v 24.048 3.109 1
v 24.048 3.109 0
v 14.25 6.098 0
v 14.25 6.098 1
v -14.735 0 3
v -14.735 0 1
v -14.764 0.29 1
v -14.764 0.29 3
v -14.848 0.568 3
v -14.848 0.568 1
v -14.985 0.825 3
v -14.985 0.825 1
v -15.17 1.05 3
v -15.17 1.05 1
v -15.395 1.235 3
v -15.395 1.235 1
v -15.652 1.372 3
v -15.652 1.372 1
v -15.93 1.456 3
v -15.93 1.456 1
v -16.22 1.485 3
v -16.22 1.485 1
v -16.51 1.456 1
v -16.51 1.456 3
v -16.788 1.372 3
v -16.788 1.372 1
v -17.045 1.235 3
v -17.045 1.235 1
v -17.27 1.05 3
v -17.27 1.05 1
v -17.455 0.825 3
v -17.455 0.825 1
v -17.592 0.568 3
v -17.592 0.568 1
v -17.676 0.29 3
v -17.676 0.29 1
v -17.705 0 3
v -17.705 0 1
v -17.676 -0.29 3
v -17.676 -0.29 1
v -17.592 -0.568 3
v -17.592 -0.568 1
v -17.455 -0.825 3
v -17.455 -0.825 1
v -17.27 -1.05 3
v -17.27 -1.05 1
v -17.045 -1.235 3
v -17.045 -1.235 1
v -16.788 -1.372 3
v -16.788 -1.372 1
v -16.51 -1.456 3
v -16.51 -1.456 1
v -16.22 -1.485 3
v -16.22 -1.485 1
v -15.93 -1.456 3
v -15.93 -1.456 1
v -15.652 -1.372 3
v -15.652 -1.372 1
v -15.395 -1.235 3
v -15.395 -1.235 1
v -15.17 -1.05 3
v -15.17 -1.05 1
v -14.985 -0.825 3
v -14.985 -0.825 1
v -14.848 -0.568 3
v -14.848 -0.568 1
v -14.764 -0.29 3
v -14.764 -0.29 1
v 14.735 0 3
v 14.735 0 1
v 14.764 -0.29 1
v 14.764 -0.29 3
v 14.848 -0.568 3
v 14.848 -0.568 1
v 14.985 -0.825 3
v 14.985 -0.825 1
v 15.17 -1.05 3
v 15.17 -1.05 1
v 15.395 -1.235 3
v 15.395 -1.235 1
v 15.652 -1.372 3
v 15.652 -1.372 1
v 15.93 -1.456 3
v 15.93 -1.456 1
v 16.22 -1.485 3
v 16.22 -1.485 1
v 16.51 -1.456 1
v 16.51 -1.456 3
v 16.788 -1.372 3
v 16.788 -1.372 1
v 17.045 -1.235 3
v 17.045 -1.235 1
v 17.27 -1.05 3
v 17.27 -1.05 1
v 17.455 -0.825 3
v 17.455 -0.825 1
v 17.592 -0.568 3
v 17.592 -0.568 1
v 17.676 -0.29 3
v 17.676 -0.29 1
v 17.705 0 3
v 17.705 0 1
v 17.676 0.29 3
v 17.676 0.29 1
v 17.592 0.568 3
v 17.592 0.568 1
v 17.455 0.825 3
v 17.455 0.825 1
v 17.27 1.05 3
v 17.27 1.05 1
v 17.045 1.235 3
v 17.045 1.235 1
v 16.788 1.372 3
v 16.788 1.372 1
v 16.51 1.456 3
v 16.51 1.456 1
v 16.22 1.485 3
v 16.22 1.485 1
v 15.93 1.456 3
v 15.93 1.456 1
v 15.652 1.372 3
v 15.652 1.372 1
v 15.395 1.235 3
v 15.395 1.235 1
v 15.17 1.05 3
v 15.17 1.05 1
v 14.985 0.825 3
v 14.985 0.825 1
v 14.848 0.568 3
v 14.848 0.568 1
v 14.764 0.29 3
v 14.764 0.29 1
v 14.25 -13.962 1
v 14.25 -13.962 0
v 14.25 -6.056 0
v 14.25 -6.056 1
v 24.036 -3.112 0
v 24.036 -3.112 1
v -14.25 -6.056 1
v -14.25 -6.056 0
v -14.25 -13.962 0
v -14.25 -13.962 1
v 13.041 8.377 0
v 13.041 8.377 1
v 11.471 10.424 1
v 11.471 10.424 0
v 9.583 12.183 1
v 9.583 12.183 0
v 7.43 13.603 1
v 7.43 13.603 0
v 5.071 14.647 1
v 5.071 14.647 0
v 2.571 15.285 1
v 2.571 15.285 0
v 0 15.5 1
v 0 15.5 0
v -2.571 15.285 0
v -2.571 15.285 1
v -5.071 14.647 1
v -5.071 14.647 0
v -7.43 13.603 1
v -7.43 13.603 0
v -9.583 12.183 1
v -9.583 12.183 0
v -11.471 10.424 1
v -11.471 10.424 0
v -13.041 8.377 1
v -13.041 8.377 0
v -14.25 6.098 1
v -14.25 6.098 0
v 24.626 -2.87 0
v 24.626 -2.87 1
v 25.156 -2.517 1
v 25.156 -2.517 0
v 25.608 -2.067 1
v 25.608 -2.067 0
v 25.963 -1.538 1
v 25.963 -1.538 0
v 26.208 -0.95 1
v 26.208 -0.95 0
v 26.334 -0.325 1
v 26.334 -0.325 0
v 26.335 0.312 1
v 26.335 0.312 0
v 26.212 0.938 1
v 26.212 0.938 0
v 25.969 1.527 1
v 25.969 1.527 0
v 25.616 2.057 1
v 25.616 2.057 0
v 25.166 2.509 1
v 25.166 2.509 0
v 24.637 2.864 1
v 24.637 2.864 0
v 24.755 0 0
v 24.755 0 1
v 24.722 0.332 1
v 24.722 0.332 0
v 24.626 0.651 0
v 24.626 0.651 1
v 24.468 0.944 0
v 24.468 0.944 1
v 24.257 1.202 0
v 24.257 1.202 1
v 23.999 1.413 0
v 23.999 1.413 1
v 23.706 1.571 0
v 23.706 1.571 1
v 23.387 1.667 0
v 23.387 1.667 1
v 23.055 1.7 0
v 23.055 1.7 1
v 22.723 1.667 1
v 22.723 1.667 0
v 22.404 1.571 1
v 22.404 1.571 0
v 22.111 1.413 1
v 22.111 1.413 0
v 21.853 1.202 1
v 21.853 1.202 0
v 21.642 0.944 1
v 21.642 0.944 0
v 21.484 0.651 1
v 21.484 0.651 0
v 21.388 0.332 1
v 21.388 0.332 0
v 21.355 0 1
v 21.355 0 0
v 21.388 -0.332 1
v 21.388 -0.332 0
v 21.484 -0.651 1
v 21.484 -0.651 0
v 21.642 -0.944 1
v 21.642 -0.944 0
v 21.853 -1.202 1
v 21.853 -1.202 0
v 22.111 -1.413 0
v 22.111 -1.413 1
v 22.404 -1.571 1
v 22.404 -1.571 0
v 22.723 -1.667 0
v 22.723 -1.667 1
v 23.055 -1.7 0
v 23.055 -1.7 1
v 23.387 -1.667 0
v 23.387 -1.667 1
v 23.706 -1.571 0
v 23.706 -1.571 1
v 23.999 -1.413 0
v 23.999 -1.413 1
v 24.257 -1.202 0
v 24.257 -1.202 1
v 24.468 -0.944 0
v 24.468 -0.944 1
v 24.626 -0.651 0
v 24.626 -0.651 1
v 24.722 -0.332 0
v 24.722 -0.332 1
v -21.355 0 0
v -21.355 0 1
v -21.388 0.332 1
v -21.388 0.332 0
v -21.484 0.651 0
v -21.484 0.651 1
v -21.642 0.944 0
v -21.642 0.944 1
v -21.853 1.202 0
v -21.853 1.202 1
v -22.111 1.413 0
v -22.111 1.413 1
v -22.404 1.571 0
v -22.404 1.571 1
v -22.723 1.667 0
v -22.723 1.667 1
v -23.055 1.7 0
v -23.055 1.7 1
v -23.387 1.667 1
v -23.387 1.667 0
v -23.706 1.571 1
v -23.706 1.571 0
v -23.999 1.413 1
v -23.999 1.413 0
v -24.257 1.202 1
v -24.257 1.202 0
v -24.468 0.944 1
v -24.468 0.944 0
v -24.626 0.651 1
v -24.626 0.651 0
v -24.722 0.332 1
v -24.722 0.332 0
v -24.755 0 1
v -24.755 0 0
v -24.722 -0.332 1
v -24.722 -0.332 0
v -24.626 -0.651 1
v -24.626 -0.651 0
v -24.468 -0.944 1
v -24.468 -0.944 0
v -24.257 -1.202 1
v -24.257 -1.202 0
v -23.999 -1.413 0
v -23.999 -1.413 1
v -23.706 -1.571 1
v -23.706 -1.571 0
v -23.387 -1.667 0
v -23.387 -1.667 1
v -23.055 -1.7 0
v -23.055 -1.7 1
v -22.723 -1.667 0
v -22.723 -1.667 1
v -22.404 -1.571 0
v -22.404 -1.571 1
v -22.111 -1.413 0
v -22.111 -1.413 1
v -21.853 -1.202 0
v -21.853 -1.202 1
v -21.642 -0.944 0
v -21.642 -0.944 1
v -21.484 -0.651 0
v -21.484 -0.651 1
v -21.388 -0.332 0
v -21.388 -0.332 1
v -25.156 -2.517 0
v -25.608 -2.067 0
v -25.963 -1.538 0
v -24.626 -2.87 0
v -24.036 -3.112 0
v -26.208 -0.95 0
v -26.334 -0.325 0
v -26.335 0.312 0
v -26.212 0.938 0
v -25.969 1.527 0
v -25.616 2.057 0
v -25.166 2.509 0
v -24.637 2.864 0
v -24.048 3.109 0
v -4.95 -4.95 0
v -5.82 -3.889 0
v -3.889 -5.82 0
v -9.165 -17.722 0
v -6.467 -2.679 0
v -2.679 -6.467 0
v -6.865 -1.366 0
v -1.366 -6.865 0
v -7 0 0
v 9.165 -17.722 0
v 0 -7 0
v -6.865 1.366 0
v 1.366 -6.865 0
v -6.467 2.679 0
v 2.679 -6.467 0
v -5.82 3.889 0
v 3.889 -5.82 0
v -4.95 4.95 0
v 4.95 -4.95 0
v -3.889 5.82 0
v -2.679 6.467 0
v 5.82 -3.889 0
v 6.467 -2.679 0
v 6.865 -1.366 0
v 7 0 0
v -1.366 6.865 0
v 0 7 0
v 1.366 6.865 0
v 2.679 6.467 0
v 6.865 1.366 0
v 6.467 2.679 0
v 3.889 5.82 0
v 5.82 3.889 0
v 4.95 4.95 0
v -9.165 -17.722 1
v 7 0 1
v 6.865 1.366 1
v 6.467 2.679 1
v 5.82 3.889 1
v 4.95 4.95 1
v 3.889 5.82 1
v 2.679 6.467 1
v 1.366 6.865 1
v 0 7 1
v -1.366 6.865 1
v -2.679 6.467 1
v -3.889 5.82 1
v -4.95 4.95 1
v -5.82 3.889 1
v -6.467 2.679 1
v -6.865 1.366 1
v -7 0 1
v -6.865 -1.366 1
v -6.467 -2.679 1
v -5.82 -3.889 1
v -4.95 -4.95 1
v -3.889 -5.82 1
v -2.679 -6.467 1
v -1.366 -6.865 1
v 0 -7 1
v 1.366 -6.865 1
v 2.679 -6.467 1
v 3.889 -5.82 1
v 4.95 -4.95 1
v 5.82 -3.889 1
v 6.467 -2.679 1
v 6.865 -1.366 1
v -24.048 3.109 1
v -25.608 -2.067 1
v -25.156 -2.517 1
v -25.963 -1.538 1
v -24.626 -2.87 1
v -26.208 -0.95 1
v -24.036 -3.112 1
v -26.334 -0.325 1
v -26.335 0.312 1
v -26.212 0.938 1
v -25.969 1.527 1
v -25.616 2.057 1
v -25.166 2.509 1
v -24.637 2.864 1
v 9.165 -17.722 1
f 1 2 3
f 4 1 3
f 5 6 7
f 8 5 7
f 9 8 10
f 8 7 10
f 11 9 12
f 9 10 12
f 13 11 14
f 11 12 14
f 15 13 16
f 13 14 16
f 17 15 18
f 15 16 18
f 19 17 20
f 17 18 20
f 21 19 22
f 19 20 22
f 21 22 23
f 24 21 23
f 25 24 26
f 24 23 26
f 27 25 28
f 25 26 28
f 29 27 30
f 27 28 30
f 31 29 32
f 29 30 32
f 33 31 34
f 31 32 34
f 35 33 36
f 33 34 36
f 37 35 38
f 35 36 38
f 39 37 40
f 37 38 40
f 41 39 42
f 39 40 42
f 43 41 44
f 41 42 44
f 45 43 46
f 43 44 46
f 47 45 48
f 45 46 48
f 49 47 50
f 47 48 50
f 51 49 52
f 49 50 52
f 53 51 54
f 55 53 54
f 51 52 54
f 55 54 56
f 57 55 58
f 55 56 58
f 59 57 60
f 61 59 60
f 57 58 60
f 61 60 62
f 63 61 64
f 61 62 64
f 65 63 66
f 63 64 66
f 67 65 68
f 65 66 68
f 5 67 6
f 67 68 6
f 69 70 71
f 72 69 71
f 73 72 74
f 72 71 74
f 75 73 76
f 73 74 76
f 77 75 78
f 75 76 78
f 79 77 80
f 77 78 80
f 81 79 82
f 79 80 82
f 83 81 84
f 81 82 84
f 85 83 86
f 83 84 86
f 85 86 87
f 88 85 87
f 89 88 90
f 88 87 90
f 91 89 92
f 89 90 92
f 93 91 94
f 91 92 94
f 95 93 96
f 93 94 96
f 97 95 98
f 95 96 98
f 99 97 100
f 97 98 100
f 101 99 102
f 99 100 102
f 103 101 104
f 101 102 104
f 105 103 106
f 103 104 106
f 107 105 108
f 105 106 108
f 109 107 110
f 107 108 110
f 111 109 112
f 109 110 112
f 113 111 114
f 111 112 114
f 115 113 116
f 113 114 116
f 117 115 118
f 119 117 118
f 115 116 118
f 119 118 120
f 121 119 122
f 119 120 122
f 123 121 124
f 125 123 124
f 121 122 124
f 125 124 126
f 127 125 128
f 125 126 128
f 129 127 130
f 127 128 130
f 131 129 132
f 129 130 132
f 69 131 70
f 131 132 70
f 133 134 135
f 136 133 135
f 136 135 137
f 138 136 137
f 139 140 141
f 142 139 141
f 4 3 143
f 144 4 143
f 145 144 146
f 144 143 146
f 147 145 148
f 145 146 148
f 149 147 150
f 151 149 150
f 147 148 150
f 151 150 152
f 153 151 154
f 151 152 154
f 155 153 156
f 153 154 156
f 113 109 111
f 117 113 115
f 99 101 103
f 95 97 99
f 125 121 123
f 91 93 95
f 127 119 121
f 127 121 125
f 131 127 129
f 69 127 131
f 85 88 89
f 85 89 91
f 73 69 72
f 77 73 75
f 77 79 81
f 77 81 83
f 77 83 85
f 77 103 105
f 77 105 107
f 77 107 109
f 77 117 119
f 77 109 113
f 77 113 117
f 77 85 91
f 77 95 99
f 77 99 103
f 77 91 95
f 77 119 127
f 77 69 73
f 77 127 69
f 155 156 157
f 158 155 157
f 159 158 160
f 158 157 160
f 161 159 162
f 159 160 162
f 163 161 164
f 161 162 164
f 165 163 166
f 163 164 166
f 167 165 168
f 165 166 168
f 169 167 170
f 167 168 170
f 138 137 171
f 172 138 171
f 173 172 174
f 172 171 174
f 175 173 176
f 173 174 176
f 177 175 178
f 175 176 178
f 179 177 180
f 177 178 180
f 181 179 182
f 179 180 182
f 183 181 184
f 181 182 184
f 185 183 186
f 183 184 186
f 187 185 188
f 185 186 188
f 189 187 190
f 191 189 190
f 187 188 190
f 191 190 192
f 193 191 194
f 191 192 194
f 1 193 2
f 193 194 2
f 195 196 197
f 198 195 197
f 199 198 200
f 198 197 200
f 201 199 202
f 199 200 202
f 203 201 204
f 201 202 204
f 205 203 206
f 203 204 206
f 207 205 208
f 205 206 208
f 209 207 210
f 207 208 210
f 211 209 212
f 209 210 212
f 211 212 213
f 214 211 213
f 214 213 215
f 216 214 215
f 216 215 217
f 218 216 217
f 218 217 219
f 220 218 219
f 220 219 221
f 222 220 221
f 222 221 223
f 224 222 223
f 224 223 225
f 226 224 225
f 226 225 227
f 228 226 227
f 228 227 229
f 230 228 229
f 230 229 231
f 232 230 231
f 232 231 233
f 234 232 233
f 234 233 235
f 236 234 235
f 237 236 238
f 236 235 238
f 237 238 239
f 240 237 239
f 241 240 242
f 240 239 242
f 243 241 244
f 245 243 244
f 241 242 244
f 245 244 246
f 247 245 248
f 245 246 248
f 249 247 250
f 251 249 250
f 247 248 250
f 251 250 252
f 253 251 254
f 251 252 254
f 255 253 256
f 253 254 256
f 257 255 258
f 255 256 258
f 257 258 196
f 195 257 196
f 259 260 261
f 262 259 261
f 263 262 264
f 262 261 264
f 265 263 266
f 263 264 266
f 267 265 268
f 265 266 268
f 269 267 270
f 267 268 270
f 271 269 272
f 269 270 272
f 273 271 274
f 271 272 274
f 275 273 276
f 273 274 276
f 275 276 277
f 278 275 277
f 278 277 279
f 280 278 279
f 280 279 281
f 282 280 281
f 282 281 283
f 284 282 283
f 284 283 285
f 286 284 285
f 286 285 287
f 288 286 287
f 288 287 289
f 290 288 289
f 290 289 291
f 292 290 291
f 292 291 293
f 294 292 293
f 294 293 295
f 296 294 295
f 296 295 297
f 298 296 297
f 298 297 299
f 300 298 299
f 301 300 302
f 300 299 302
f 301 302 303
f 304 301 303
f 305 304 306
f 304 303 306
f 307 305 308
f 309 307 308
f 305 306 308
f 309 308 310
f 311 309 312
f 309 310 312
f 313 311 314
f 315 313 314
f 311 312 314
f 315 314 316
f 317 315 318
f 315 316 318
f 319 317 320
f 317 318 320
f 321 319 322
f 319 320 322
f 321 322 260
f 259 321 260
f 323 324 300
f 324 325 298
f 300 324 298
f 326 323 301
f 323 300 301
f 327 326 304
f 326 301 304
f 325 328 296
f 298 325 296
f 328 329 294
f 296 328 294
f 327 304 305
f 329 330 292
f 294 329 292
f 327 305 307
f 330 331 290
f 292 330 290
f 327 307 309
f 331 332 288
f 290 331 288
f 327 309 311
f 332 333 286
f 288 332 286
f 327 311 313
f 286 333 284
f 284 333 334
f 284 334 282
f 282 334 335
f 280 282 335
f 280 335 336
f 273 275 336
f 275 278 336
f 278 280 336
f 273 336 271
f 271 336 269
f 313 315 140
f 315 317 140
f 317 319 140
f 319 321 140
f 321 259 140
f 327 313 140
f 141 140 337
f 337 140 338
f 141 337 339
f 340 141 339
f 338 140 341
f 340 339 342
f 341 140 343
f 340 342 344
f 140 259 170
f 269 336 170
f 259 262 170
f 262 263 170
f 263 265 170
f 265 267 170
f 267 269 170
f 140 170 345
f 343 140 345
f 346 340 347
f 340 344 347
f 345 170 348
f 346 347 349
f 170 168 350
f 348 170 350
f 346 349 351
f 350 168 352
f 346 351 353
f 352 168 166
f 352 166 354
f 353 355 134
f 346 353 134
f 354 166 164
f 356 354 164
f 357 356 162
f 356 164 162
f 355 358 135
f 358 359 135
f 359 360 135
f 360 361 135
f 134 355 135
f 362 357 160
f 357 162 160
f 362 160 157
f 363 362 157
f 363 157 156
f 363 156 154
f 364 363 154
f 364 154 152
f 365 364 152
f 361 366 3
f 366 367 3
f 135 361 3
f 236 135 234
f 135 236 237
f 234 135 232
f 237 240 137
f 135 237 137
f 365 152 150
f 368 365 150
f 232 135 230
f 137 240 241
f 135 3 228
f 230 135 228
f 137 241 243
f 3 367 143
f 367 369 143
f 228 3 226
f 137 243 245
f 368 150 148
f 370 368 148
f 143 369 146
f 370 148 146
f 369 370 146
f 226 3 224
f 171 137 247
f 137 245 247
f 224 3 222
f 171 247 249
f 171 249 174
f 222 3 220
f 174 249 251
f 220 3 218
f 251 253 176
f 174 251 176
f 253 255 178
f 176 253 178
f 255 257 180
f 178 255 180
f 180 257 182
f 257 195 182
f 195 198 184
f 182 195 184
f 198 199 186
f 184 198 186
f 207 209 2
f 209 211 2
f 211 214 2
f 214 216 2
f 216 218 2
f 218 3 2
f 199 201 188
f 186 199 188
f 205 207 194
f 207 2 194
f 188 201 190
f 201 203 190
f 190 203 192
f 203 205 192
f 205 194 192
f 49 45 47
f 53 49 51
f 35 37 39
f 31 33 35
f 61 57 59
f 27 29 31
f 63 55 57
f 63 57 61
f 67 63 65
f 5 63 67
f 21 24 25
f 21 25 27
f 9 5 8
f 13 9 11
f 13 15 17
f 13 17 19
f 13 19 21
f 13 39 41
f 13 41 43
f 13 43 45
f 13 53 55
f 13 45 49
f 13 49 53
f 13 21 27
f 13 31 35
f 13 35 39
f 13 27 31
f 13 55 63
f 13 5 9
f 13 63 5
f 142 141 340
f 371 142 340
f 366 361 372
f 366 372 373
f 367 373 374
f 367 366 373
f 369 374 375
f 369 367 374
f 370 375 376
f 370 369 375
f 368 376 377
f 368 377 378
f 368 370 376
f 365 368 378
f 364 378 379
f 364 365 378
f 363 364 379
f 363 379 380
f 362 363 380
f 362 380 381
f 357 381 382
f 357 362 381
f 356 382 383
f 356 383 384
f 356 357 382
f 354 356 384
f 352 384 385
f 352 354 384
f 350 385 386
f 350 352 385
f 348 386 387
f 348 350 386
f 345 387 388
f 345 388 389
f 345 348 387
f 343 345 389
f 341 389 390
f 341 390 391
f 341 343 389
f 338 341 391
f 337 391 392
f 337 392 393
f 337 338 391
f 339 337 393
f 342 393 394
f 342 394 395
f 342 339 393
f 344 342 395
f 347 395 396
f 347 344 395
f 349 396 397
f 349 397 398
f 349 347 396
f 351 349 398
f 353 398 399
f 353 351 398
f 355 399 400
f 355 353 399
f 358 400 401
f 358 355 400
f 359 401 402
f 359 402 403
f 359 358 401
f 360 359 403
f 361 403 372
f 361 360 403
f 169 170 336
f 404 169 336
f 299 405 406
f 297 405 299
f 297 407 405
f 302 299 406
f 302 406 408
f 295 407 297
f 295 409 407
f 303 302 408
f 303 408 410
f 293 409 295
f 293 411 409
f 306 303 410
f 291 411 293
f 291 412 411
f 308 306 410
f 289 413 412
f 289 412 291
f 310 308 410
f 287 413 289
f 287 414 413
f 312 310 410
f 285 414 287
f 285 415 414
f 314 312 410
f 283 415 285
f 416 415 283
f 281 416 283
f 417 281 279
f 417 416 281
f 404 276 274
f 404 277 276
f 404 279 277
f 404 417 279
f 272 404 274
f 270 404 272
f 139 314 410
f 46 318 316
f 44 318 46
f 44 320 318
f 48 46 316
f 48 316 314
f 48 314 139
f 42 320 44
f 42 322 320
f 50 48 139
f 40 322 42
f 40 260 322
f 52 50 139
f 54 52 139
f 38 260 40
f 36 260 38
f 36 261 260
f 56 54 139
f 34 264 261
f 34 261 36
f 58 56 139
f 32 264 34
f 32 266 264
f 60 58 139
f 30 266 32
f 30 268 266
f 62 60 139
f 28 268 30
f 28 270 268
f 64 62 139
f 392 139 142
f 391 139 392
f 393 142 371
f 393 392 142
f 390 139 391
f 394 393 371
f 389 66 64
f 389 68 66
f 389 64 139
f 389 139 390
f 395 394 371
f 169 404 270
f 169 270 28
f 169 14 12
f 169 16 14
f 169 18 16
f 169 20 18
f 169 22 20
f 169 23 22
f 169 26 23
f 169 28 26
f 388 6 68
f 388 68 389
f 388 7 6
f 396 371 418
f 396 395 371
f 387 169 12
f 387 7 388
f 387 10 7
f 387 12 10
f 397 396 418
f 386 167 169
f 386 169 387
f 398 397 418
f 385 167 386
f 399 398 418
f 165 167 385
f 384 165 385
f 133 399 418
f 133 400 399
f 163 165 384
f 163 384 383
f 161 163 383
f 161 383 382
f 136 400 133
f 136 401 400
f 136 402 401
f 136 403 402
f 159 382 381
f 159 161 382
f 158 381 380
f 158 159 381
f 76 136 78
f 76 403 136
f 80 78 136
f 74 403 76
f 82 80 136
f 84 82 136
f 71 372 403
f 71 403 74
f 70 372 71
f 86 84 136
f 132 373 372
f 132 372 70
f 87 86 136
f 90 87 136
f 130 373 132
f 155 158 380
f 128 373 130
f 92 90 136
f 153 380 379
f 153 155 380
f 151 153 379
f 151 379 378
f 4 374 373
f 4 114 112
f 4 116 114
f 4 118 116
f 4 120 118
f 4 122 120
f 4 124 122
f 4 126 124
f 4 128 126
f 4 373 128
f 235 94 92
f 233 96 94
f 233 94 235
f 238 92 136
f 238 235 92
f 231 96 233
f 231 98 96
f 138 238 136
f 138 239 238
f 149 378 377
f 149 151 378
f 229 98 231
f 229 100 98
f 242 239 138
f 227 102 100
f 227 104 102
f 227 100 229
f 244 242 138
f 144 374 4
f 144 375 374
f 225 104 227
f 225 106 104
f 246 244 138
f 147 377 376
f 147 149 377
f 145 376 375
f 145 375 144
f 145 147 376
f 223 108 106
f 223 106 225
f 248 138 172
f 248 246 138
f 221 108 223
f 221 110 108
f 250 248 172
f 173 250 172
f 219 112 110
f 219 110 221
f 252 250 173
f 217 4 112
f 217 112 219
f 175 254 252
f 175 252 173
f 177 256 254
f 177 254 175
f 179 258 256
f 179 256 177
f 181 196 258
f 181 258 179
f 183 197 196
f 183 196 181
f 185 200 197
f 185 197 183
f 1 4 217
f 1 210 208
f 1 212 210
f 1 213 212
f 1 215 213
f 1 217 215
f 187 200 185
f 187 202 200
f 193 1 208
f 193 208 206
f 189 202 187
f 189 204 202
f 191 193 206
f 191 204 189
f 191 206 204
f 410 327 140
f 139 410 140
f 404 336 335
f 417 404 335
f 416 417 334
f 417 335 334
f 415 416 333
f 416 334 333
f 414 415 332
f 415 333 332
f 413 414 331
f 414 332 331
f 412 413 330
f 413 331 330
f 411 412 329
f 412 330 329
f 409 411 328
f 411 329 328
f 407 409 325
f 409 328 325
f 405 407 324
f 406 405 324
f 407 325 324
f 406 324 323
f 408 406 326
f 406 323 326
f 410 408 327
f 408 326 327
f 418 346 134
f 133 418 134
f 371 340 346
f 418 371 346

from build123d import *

# Parameters (mm, degrees)
SKETCH1_R           = 7
BOSS_EXTRUDE1_DEPTH = 1
SKETCH2_R           = 1.485
BOSS_EXTRUDE2_DEPTH = 2
SKETCH2_5_R         = 1.7
CUT_EXTRUDE1_DEPTH  = 32.818104658


with BuildPart() as part:
    # Sketch1 → Boss-Extrude1 (new body)
    with BuildSketch(Plane.XY):
        with BuildLine():
            Line((9.165, -17.722), (14.25, -13.9625))
            Line((14.25, -13.9625), (14.25, -6.056))
            Line((14.25, -6.056), (24.036185701, -3.112242975))
            ThreePointArc((24.036185701, -3.112242975), (26.349993684, -0.006407429), (24.048450078, 3.108527376))
            Line((24.048450078, 3.108527376), (14.25, 6.098155459))
            ThreePointArc((14.25, 6.098155459), (8.536058528, 12.937762743), (0, 15.5))
            ThreePointArc((0, 15.5), (-8.536058528, 12.937762743), (-14.25, 6.098155459))
            Line((-14.25, 6.098155459), (-24.048450078, 3.108527376))
            ThreePointArc((-24.048450078, 3.108527376), (-26.349993684, -0.006407429), (-24.036185701, -3.112242975))
            Line((-24.036185701, -3.112242975), (-14.25, -6.056))
            Line((-14.25, -6.056), (-14.25, -13.9625))
            Line((-14.25, -13.9625), (-9.165, -17.722))
            Line((-9.165, -17.722), (9.165, -17.722))
        make_face()
        Circle(SKETCH1_R, mode=Mode.SUBTRACT)
    extrude(amount=BOSS_EXTRUDE1_DEPTH)

    # Sketch2 → Boss-Extrude2 (add)
    with BuildSketch(Plane.XY.offset(1)):
        with Locations((-16.22, 0)):
            Circle(SKETCH2_R)
        with Locations((16.22, 0)):
            Circle(SKETCH2_R)
    extrude(amount=BOSS_EXTRUDE2_DEPTH)

    # Sketch2<5> → Cut-Extrude1 (cut, through all)
    with BuildSketch(Plane.XY.offset(1)):
        with Locations((-23.055, 0)):
            Circle(SKETCH2_5_R)
        with Locations((23.055, 0)):
            Circle(SKETCH2_5_R)
    extrude(amount=-CUT_EXTRUDE1_DEPTH, mode=Mode.SUBTRACT)


solid = part.part
